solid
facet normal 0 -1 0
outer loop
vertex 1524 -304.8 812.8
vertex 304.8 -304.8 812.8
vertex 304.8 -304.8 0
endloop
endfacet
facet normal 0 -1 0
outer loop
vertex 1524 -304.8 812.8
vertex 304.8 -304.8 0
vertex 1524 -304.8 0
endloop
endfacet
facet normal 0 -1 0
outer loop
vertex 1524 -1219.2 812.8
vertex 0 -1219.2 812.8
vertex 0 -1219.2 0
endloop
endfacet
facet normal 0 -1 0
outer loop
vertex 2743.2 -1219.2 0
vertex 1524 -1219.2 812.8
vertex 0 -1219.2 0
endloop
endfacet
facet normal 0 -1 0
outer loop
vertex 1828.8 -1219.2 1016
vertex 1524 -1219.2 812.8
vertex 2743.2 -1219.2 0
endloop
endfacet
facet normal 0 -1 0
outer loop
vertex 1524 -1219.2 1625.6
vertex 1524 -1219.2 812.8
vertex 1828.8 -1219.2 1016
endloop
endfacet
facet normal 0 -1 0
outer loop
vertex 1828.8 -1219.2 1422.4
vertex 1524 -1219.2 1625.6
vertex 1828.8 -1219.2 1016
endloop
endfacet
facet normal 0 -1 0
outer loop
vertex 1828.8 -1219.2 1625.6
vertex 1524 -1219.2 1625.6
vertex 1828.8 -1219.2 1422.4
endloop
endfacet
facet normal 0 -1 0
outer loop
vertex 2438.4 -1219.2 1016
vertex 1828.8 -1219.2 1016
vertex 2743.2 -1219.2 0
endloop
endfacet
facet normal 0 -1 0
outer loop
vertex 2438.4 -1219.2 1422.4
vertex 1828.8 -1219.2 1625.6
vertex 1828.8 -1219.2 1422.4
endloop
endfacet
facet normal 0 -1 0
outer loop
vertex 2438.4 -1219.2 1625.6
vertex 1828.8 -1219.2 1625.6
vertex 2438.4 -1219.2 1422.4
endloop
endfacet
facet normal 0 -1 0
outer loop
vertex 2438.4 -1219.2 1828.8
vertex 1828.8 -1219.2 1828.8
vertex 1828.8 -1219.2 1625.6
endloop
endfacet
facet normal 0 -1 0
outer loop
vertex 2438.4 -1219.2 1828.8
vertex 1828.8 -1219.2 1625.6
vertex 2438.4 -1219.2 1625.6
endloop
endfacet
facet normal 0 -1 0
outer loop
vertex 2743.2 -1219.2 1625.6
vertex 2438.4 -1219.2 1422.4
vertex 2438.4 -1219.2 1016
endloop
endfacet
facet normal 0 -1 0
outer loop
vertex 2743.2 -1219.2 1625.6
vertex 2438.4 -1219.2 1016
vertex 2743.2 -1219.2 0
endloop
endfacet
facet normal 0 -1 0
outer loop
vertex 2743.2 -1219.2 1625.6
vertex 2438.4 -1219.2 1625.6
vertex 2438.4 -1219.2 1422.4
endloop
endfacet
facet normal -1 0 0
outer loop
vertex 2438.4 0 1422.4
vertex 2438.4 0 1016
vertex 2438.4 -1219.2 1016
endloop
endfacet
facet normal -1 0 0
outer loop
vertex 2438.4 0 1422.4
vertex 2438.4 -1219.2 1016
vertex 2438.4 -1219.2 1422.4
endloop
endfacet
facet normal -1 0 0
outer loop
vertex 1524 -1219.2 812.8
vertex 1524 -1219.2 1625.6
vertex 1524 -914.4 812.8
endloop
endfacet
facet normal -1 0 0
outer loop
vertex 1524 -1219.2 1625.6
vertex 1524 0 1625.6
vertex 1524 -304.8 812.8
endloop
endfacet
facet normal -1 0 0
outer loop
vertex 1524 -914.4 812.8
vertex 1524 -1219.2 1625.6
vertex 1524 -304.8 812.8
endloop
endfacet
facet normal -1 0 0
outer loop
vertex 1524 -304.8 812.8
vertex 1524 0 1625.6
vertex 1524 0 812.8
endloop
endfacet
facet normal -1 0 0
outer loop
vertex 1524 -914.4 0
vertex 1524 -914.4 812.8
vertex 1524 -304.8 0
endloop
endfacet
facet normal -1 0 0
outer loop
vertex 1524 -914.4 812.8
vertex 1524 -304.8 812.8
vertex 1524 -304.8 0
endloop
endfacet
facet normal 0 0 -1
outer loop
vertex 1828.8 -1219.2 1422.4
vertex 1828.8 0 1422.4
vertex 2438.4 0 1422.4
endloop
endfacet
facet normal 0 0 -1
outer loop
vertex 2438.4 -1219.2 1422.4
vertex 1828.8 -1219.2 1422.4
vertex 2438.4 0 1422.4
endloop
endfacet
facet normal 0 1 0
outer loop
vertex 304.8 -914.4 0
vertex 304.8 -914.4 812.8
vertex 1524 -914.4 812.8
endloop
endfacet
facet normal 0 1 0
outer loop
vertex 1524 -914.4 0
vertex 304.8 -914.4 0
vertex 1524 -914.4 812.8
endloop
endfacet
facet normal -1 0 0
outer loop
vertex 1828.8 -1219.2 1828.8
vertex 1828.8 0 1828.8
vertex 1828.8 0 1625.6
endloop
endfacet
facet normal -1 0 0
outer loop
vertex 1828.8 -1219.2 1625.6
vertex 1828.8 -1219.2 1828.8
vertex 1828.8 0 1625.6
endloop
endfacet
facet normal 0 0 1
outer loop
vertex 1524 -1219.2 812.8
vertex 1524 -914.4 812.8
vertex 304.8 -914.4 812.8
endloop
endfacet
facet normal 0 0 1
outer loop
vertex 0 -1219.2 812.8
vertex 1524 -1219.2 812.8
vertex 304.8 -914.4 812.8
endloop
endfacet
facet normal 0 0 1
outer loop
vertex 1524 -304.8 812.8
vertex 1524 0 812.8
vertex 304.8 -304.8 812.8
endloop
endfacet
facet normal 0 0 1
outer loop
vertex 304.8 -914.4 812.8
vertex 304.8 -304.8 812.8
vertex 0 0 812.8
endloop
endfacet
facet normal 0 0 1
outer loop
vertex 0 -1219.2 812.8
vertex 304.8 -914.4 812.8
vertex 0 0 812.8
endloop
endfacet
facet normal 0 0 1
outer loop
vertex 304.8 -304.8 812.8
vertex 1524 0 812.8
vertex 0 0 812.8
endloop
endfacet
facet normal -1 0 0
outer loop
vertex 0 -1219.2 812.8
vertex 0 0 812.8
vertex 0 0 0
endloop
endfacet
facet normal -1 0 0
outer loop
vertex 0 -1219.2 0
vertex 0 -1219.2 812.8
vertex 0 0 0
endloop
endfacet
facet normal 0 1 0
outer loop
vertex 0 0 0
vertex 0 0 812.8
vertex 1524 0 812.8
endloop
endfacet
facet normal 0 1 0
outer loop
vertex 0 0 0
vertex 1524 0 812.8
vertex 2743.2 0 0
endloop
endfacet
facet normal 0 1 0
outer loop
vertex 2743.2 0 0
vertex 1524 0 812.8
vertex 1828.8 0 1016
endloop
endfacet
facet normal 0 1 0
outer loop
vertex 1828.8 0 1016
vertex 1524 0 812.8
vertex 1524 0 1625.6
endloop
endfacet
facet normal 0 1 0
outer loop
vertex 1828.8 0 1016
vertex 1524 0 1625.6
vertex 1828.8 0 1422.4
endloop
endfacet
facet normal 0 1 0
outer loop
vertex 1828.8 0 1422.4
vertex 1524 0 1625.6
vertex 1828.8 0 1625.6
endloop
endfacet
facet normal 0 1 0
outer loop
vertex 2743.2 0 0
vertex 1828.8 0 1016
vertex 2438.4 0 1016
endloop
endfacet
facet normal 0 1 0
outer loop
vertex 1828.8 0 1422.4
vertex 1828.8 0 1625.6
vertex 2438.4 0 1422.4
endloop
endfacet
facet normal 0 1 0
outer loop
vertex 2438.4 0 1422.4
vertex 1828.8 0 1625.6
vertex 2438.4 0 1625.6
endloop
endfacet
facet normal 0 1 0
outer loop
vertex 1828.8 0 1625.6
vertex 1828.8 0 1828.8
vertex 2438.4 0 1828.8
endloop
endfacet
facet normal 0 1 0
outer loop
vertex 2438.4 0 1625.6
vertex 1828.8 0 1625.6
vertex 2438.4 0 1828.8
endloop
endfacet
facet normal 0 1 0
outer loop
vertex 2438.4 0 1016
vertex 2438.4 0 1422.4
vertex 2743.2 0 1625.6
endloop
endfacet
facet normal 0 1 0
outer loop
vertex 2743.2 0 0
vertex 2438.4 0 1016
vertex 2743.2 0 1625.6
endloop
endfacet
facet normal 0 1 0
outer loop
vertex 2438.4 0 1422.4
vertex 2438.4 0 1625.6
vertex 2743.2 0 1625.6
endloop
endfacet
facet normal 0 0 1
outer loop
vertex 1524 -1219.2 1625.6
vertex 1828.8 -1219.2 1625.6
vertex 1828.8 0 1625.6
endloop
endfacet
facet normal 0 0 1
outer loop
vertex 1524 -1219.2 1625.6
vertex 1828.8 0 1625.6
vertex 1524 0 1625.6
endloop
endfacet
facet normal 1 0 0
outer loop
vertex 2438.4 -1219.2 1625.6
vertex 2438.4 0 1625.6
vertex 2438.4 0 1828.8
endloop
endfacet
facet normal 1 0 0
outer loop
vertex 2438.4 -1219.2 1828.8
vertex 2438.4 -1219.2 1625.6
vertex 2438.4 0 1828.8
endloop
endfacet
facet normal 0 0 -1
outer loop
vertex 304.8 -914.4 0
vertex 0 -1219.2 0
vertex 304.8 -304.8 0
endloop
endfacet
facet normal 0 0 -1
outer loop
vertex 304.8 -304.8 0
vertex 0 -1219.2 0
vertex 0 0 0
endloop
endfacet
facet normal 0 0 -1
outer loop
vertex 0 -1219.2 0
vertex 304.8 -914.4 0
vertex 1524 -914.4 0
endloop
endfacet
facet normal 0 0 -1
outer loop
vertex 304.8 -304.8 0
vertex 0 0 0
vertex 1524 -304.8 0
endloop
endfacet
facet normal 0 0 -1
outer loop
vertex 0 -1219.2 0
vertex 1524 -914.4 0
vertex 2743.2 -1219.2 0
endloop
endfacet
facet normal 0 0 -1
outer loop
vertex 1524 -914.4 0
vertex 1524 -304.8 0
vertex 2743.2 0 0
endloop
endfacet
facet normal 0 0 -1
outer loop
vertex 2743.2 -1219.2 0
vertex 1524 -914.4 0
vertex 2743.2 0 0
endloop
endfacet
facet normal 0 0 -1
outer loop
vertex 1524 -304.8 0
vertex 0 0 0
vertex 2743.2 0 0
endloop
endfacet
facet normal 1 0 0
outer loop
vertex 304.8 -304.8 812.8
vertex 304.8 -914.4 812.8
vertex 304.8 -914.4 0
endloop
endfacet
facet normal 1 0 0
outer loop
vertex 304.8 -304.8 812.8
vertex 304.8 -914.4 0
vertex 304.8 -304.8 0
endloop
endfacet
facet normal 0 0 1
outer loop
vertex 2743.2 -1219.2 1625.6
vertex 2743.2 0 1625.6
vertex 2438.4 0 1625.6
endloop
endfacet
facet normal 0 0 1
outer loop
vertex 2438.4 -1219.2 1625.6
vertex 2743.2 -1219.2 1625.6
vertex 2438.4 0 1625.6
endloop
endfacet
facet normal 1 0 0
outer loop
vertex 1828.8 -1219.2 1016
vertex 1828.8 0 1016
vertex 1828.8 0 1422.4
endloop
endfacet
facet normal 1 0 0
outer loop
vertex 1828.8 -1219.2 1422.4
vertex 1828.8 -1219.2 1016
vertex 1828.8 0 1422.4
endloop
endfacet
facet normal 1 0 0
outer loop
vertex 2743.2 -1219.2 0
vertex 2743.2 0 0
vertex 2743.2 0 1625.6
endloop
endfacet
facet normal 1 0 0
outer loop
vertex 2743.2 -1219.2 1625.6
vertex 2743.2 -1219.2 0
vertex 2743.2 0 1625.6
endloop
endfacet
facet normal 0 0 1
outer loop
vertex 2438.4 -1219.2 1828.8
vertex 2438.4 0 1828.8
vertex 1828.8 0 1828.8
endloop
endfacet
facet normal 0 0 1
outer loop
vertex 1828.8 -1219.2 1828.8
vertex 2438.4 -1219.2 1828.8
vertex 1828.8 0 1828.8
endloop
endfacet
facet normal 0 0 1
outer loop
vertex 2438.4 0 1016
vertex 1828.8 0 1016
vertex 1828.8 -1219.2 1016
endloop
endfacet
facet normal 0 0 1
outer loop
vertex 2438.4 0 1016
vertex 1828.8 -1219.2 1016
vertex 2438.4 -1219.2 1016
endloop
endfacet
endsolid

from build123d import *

# Parameters (mm, degrees)
F0_W     = 609.6
F0_H     = 406.4
F1_DEPTH = 1219.2
F2_W     = 1219.2
F2_H     = 609.6
F3_DEPTH = 812.8


with BuildPart() as f1:
    # F0 (on Front) → F1 (new body)
    with BuildSketch(Plane.XZ):
        Polygon((0, 812.8), (0, 0), (2743.2, 0), (2743.2, 1625.6), (2438.4, 1625.6), (2438.4, 1828.8), (1828.8, 1828.8), (1828.8, 1625.6), (1524, 1625.6), (1524, 812.8), align=None)
        with Locations((2133.6, 1219.2)):
            Rectangle(F0_W, F0_H, mode=Mode.SUBTRACT)
    extrude(amount=F1_DEPTH)

    # F2 (on face) → F3 (cut)
    with BuildSketch(Plane.XY.offset(812.8)):
        with Locations((914.4, -609.6)):
            Rectangle(F2_W, F2_H)
    extrude(amount=-F3_DEPTH, mode=Mode.SUBTRACT)


solid = f1.part
